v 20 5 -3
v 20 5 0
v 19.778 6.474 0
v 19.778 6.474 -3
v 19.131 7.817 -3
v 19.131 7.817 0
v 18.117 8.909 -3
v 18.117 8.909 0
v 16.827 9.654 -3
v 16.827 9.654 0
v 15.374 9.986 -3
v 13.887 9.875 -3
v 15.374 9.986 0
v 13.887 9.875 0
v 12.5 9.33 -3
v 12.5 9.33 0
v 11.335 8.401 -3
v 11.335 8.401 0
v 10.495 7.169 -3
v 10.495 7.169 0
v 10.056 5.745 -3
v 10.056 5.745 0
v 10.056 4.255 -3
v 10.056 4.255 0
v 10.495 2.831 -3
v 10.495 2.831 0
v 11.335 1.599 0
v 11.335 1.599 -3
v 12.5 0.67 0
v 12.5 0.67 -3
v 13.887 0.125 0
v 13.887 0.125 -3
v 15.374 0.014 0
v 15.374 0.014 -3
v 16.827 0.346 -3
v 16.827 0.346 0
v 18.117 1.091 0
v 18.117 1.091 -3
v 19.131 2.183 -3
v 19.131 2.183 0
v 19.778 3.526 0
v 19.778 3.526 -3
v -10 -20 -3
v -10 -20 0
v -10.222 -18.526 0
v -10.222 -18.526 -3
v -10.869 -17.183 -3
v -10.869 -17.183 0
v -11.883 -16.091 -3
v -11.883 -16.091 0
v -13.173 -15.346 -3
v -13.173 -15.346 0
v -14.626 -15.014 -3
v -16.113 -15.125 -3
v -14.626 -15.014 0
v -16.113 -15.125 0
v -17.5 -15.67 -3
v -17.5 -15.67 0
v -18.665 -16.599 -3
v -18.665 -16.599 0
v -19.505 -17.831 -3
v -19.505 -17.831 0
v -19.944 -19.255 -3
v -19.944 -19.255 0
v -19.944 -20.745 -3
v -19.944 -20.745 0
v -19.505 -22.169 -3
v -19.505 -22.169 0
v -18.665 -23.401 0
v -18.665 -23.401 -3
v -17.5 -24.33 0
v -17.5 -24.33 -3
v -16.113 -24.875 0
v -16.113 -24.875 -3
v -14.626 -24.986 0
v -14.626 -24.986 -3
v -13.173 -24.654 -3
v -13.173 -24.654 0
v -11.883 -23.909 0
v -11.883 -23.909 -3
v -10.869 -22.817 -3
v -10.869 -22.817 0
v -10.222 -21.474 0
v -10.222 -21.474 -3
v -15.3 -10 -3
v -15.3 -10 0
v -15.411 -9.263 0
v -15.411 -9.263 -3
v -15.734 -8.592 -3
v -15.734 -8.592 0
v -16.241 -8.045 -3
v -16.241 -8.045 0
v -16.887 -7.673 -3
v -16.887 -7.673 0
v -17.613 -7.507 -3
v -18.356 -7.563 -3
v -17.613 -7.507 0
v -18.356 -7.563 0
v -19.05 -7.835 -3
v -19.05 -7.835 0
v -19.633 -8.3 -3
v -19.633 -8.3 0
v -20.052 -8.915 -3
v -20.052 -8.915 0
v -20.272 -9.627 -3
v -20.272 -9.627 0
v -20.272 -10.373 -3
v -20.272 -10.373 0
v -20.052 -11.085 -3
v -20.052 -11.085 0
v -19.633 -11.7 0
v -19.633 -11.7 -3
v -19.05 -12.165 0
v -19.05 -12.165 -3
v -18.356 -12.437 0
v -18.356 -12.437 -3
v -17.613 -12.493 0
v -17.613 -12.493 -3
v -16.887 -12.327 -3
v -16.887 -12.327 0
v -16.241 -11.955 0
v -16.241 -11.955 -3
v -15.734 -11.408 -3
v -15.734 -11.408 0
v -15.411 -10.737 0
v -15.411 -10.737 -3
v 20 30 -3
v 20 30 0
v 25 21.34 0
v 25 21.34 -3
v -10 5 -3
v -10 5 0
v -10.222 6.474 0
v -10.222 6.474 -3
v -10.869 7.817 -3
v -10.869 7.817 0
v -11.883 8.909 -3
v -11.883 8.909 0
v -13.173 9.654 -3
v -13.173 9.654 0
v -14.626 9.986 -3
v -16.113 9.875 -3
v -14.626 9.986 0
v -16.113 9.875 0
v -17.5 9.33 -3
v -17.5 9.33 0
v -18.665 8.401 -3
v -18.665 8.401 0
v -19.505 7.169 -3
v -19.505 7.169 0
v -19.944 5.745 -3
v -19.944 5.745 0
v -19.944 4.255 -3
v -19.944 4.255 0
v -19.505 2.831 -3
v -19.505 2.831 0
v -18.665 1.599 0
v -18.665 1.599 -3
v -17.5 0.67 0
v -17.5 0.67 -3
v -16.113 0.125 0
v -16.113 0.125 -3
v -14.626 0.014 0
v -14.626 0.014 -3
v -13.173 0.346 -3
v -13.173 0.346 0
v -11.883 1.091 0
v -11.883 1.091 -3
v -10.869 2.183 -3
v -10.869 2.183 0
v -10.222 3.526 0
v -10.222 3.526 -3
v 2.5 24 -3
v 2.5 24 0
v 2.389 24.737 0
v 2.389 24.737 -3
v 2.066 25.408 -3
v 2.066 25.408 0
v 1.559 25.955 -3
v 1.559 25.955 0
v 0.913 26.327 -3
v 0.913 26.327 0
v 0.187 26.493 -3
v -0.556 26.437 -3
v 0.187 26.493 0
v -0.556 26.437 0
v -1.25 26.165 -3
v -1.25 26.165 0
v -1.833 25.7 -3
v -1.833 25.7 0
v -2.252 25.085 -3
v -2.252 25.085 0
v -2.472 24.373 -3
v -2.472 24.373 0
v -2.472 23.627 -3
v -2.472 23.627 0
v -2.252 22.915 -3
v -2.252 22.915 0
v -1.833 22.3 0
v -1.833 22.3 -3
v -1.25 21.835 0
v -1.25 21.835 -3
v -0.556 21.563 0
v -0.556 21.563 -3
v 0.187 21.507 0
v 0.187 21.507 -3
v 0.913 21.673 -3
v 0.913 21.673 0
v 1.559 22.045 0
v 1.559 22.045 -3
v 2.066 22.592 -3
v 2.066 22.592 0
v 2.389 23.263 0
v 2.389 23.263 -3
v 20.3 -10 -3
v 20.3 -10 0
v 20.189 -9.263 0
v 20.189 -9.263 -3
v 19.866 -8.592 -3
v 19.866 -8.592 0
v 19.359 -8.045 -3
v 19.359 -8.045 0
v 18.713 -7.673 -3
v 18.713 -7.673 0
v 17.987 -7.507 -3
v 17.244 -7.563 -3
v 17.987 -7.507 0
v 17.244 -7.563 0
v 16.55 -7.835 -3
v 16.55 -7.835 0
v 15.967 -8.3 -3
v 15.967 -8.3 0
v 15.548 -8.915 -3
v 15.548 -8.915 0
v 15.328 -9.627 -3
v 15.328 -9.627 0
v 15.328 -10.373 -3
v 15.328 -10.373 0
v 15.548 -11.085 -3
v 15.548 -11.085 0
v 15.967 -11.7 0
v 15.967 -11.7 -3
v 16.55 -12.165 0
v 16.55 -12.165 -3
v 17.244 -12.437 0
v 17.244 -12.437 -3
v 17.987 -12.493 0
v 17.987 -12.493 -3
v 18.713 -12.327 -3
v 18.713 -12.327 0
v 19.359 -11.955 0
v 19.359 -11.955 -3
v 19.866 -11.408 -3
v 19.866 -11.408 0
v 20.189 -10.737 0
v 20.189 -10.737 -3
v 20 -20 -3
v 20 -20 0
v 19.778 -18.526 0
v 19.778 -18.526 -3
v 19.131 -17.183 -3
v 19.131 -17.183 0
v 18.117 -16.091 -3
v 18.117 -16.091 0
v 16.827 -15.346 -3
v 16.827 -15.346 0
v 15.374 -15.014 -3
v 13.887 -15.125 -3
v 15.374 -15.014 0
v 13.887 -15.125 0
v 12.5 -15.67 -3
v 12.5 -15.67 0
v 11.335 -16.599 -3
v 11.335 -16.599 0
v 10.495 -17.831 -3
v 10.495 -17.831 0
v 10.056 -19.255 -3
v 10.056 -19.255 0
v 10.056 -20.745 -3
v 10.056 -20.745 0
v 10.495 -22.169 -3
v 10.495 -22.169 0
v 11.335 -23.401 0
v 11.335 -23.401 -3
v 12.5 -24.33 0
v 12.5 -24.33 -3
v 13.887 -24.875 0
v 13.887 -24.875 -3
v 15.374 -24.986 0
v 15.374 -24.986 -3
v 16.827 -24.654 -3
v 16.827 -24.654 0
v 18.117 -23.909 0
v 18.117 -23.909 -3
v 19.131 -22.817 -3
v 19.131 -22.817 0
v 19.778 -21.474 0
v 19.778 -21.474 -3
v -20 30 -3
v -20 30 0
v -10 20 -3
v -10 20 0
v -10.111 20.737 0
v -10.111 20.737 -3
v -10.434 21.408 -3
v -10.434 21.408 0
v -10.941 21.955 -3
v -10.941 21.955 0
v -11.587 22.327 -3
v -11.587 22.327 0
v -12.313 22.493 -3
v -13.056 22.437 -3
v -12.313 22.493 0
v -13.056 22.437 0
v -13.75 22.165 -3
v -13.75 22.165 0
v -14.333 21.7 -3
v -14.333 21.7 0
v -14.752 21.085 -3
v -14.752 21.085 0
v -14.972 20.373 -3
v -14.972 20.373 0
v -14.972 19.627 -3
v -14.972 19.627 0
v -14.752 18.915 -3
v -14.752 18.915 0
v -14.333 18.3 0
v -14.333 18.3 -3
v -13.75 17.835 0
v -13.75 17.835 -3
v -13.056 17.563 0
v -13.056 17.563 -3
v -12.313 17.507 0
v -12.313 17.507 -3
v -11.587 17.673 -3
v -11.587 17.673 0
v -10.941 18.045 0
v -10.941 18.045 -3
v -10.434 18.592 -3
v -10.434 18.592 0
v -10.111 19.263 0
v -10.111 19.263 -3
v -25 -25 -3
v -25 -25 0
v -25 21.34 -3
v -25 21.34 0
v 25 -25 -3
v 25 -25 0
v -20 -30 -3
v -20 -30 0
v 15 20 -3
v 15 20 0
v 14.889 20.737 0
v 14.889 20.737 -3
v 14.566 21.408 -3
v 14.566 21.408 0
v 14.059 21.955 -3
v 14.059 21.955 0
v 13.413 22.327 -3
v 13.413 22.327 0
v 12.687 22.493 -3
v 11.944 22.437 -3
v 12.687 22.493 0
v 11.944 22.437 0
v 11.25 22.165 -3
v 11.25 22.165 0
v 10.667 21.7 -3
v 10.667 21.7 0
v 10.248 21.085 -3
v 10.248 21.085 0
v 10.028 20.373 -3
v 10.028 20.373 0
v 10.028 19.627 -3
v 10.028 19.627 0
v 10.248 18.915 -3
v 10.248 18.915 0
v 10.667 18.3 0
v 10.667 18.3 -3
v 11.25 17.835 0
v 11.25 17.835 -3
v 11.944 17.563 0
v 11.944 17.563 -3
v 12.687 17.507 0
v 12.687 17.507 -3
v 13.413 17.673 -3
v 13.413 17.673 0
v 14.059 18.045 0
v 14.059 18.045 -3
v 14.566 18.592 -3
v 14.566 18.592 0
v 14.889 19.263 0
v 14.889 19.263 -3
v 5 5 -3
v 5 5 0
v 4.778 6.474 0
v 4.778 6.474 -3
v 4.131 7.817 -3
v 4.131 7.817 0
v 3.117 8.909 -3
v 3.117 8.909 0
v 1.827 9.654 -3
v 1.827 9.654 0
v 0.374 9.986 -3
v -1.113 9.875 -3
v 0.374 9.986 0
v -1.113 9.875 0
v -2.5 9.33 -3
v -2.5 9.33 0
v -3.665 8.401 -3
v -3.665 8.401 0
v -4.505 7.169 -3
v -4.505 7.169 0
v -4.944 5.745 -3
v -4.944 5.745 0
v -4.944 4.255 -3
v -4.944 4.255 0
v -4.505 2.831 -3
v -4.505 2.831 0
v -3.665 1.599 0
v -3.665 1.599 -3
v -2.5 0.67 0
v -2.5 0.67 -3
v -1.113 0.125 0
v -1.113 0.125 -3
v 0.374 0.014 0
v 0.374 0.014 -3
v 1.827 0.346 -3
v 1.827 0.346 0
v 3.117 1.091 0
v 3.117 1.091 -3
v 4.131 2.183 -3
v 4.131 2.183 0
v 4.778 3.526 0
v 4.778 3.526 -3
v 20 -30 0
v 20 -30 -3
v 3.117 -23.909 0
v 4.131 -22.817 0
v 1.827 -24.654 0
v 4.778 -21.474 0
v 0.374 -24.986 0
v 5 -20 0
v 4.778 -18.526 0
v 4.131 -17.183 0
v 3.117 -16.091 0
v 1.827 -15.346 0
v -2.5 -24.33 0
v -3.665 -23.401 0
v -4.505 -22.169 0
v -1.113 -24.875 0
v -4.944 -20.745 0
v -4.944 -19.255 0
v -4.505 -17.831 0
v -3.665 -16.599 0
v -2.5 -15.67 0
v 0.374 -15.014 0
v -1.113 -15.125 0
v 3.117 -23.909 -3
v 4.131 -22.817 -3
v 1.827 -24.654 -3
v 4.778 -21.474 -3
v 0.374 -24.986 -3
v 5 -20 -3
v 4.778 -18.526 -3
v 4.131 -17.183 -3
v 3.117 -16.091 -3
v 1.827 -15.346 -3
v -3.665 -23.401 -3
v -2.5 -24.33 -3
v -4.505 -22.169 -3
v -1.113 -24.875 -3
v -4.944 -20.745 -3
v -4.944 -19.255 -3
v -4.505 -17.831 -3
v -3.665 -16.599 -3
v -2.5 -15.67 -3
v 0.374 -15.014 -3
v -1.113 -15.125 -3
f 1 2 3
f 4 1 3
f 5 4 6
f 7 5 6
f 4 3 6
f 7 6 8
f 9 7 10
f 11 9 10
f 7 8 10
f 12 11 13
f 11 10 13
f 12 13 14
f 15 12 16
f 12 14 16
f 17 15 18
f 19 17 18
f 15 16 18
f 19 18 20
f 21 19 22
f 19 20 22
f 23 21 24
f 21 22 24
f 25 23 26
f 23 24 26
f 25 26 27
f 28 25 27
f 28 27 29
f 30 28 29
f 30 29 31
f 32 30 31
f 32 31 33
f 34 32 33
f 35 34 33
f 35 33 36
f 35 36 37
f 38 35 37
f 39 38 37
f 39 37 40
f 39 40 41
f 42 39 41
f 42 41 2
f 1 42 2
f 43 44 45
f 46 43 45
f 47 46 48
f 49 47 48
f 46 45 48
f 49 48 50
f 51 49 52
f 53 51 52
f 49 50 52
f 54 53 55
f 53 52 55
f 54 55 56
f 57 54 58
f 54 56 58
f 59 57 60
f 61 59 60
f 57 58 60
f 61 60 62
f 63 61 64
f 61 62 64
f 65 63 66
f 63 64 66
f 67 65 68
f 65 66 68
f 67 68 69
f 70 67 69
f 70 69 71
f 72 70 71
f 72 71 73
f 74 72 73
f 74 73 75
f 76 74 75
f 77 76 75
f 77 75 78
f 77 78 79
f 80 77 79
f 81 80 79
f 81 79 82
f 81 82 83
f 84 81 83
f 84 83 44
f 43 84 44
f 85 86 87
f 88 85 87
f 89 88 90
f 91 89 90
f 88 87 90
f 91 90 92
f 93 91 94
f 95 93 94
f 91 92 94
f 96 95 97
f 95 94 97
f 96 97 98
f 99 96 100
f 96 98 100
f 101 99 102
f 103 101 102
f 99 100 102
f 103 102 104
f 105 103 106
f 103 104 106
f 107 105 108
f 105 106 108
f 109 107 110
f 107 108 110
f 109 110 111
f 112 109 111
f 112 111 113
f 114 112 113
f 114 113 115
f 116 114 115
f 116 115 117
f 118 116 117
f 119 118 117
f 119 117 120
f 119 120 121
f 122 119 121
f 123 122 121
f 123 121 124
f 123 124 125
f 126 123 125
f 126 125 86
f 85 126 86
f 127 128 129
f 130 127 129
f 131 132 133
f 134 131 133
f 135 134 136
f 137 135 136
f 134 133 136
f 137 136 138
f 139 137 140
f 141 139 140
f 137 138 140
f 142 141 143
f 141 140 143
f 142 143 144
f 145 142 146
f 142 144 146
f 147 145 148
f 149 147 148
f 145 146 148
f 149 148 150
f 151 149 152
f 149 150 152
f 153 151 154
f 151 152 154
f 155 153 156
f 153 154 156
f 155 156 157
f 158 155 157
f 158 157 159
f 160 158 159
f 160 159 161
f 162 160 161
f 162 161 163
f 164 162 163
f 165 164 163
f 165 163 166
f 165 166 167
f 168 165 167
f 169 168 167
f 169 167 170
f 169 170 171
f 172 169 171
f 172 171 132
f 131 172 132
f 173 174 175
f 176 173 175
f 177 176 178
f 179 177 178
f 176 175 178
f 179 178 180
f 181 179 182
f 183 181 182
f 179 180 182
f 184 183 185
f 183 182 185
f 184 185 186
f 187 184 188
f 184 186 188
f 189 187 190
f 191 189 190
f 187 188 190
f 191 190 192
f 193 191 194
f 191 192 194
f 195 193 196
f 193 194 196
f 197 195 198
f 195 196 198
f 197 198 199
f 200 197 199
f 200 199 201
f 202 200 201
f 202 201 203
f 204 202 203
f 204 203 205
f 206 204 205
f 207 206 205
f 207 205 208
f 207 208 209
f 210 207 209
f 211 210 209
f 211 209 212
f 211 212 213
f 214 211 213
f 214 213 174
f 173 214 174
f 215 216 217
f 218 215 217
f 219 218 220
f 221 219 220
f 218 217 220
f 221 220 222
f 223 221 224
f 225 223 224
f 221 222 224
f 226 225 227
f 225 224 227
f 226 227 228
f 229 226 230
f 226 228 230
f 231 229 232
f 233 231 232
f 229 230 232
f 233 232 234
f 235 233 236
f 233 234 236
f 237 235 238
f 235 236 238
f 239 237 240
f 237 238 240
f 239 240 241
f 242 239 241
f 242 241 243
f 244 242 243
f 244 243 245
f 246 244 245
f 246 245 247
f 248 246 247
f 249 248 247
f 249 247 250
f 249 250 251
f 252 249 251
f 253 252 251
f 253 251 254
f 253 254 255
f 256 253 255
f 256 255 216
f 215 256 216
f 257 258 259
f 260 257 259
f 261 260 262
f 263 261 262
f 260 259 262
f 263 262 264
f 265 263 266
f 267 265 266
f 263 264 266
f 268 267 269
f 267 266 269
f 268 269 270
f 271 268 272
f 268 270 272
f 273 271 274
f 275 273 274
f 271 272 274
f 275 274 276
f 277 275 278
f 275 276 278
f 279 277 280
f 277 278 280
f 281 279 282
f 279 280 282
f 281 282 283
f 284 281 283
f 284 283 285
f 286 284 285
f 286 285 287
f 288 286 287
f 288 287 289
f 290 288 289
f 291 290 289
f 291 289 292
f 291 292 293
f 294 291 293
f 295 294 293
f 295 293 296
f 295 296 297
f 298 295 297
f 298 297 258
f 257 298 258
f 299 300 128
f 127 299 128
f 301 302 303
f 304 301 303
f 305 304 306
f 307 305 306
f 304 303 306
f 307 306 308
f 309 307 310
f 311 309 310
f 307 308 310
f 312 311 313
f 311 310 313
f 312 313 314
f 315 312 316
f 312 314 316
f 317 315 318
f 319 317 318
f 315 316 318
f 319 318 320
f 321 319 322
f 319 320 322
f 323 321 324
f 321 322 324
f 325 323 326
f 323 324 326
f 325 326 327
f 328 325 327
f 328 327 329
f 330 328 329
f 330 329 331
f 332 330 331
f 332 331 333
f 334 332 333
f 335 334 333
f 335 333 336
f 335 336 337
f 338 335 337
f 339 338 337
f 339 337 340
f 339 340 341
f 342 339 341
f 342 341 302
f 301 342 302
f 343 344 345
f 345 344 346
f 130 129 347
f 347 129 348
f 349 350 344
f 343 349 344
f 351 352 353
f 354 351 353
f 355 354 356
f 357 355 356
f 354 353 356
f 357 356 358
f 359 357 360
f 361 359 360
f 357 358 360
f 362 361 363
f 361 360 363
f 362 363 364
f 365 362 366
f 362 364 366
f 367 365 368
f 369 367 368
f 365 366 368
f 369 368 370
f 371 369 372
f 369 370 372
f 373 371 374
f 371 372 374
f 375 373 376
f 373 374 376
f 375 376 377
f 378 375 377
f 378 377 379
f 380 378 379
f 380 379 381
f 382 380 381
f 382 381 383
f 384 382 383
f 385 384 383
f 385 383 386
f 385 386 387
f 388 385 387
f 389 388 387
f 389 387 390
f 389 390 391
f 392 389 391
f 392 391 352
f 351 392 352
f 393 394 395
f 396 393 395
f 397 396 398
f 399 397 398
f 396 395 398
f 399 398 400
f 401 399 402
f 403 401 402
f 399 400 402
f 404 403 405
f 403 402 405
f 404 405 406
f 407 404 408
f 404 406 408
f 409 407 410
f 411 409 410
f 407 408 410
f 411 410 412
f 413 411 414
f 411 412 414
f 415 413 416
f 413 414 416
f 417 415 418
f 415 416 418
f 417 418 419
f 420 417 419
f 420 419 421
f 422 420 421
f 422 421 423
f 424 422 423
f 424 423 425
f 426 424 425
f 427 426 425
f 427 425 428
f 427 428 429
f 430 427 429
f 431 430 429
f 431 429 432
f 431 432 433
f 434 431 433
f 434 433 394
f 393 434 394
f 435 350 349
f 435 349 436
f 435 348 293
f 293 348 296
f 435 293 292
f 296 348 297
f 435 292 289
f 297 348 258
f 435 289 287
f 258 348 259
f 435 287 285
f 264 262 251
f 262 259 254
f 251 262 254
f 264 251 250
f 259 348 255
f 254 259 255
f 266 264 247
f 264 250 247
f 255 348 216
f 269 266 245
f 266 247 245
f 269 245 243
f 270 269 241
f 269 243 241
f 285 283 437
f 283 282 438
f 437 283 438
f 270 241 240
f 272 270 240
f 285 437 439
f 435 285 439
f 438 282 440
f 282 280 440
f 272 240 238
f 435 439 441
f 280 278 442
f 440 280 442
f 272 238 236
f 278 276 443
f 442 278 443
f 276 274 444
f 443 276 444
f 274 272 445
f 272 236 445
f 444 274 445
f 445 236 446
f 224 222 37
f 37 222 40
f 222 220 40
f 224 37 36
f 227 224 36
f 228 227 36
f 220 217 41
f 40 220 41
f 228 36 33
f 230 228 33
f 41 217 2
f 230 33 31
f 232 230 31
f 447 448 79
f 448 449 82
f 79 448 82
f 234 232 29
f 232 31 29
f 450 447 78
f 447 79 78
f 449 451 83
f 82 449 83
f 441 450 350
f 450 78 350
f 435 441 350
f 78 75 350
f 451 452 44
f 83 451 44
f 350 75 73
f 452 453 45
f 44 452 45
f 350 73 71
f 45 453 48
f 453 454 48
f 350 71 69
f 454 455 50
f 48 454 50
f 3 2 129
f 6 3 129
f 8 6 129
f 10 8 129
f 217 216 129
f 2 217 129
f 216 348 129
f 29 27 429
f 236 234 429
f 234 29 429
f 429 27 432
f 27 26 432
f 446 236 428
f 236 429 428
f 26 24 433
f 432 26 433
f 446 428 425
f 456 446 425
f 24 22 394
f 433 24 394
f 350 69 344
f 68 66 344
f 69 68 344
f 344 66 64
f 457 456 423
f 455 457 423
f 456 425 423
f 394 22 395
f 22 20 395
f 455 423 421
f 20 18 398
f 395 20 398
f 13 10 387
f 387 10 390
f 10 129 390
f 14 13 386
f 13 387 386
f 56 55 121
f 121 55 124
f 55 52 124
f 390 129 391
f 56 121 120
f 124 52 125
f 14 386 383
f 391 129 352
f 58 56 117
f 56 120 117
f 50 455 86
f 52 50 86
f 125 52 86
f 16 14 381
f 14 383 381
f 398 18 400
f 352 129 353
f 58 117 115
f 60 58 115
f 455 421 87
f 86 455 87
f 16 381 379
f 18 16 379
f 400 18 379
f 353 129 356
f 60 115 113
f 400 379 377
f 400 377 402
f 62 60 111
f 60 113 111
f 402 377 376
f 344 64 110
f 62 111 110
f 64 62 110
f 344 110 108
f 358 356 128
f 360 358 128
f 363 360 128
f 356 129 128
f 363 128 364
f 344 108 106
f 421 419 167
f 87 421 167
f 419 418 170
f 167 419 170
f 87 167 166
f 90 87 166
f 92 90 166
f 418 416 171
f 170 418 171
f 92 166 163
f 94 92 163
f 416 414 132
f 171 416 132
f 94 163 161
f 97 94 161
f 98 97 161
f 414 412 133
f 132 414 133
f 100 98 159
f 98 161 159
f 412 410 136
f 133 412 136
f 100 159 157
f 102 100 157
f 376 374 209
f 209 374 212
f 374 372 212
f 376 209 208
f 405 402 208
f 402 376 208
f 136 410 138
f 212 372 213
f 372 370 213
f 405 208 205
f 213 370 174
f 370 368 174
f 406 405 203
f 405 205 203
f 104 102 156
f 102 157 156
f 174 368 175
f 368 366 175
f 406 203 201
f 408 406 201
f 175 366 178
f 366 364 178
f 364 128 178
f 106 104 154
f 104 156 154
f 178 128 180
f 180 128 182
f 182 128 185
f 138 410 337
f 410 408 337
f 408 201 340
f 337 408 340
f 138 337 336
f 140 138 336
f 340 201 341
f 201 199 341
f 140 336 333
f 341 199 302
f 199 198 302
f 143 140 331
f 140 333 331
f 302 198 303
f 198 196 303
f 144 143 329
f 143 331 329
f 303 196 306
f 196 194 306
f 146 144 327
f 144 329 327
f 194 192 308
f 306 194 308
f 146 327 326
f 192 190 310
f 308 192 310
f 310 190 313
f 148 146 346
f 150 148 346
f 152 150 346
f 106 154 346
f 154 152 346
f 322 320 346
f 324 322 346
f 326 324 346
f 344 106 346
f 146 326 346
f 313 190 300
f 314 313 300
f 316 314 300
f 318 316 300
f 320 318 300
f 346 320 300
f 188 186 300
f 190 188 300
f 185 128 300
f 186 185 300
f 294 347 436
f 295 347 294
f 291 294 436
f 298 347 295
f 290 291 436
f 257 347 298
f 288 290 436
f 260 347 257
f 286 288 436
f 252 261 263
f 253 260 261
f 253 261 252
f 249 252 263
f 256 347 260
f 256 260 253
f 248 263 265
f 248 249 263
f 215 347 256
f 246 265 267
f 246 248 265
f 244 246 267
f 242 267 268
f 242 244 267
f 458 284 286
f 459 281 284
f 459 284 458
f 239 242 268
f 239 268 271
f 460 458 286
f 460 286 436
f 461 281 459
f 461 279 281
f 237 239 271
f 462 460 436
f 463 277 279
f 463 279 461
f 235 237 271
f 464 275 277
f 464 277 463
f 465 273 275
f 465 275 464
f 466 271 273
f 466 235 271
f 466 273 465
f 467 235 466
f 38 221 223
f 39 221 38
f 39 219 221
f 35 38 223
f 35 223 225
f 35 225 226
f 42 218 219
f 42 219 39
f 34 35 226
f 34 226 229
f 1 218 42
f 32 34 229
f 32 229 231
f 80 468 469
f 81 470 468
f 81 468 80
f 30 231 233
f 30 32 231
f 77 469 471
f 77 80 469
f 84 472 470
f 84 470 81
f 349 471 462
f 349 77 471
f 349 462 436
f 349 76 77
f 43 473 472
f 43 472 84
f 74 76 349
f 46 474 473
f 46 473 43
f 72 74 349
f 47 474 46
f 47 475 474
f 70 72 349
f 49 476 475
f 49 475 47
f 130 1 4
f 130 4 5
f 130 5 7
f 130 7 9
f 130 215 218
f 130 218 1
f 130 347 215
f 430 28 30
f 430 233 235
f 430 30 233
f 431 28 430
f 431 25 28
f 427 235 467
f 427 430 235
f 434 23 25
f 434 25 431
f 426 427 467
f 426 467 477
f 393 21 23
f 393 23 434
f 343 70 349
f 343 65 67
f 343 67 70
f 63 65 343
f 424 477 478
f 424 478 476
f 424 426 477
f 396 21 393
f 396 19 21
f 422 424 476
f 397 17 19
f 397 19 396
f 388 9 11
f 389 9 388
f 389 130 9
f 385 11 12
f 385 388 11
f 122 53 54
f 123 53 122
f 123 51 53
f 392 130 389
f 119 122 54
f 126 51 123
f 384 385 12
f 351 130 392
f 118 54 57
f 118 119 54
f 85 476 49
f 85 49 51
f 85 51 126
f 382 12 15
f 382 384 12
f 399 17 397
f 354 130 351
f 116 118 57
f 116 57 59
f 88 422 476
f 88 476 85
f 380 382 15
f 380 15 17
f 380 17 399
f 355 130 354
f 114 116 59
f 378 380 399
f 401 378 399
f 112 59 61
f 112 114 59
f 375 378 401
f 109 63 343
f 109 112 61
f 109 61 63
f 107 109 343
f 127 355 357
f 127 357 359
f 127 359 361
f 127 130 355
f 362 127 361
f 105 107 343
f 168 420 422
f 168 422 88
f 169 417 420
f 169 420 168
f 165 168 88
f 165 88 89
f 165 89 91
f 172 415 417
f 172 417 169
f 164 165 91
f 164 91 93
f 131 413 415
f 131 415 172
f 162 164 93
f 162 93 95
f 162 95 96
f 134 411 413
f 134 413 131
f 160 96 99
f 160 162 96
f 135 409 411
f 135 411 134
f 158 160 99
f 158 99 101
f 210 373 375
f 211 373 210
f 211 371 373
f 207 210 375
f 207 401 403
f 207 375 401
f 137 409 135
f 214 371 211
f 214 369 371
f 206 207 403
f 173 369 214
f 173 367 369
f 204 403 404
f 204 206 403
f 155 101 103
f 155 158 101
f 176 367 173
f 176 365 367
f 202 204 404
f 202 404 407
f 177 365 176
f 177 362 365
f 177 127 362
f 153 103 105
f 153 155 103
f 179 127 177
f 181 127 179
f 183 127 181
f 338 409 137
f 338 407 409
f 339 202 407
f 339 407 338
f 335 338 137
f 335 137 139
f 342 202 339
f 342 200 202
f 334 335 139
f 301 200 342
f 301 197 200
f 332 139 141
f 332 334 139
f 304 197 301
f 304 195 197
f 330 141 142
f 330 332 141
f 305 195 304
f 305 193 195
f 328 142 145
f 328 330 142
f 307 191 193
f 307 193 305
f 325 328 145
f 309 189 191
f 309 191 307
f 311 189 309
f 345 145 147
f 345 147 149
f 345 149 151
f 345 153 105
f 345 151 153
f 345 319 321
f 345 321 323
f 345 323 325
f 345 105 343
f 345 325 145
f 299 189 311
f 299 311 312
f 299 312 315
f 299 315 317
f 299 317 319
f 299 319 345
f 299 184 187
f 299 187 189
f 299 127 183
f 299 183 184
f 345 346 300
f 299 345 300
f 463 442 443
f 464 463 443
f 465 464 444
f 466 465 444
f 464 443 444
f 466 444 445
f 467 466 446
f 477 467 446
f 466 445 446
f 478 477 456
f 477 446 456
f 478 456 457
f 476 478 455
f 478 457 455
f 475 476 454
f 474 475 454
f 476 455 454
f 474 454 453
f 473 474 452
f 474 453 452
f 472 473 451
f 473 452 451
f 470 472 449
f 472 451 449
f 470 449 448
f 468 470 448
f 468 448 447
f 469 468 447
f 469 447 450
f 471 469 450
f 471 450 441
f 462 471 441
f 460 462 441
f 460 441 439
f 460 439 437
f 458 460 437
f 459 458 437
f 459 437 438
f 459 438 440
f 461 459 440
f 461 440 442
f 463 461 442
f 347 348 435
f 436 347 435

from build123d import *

# Parameters (mm, degrees)
SM_BASE_FLANGE_1_DEPTH = 3
CUT_EXTRUDE_1_REACH    = 41.166
SKETCH_6_R             = 2.5
CUT_EXTRUDE_2_REACH    = 41.166
SKETCH_7_R             = 5


# Sheet-metal steps are written as plain solids
with BuildPart() as part:
    # Sketch 1 → 基体-法兰1 (new body)
    with BuildSketch(Plane.XY):
        Polygon((20, -30), (14.284239003, -30), (-14.284239003, -30), (-20, -30), (-25, -25), (-25, 21.339745962), (-20, 30), (20, 30), (25, 21.339745962), (25, -25), align=None)
    extrude(amount=-SM_BASE_FLANGE_1_DEPTH)

    # 草图6 → 切除-拉伸1 (cut, up to next)
    with BuildSketch(Plane.XY, mode=Mode.PRIVATE) as cut_extrude_1_sk1:
        with Locations((0, 24)):
            Circle(SKETCH_6_R)
    cut_extrude_1_tool1 = extrude(cut_extrude_1_sk1.sketch, amount=-CUT_EXTRUDE_1_REACH, mode=Mode.PRIVATE) & part.part
    # 草图6 → 切除-拉伸1 (cut, up to next)
    with BuildSketch(Plane.XY, mode=Mode.PRIVATE) as cut_extrude_1_sk2:
        with Locations((-17.8, -10)):
            Circle(SKETCH_6_R)
    cut_extrude_1_tool2 = extrude(cut_extrude_1_sk2.sketch, amount=-CUT_EXTRUDE_1_REACH, mode=Mode.PRIVATE) & part.part
    # 草图6 → 切除-拉伸1 (cut, up to next)
    with BuildSketch(Plane.XY, mode=Mode.PRIVATE) as cut_extrude_1_sk3:
        with Locations((17.8, -10)):
            Circle(SKETCH_6_R)
    cut_extrude_1_tool3 = extrude(cut_extrude_1_sk3.sketch, amount=-CUT_EXTRUDE_1_REACH, mode=Mode.PRIVATE) & part.part
    # 草图6 → 切除-拉伸1 (cut, up to next)
    with BuildSketch(Plane.XY, mode=Mode.PRIVATE) as cut_extrude_1_sk4:
        with Locations((-12.5, 20)):
            Circle(SKETCH_6_R)
    cut_extrude_1_tool4 = extrude(cut_extrude_1_sk4.sketch, amount=-CUT_EXTRUDE_1_REACH, mode=Mode.PRIVATE) & part.part
    # 草图6 → 切除-拉伸1 (cut, up to next)
    with BuildSketch(Plane.XY, mode=Mode.PRIVATE) as cut_extrude_1_sk5:
        with Locations((12.5, 20)):
            Circle(SKETCH_6_R)
    cut_extrude_1_tool5 = extrude(cut_extrude_1_sk5.sketch, amount=-CUT_EXTRUDE_1_REACH, mode=Mode.PRIVATE) & part.part
    add(cut_extrude_1_tool1.solids().sort_by_distance((0, 24, 0))[0], mode=Mode.SUBTRACT)
    add(cut_extrude_1_tool2.solids().sort_by_distance((-17.8, -10, 0))[0], mode=Mode.SUBTRACT)
    add(cut_extrude_1_tool3.solids().sort_by_distance((17.8, -10, 0))[0], mode=Mode.SUBTRACT)
    add(cut_extrude_1_tool4.solids().sort_by_distance((-12.5, 20, 0))[0], mode=Mode.SUBTRACT)
    add(cut_extrude_1_tool5.solids().sort_by_distance((12.5, 20, 0))[0], mode=Mode.SUBTRACT)

    # 草图7 → 切除-拉伸2 (cut, up to next)
    with BuildSketch(Plane.XY, mode=Mode.PRIVATE) as cut_extrude_2_sk1:
        with Locations((-15, 5)):
            Circle(SKETCH_7_R)
    cut_extrude_2_tool1 = extrude(cut_extrude_2_sk1.sketch, amount=-CUT_EXTRUDE_2_REACH, mode=Mode.PRIVATE) & part.part
    # 草图7 → 切除-拉伸2 (cut, up to next)
    with BuildSketch(Plane.XY, mode=Mode.PRIVATE) as cut_extrude_2_sk2:
        with Locations((15, 5)):
            Circle(SKETCH_7_R)
    cut_extrude_2_tool2 = extrude(cut_extrude_2_sk2.sketch, amount=-CUT_EXTRUDE_2_REACH, mode=Mode.PRIVATE) & part.part
    # 草图7 → 切除-拉伸2 (cut, up to next)
    with BuildSketch(Plane.XY, mode=Mode.PRIVATE) as cut_extrude_2_sk3:
        with Locations((0, -20)):
            Circle(SKETCH_7_R)
    cut_extrude_2_tool3 = extrude(cut_extrude_2_sk3.sketch, amount=-CUT_EXTRUDE_2_REACH, mode=Mode.PRIVATE) & part.part
    # 草图7 → 切除-拉伸2 (cut, up to next)
    with BuildSketch(Plane.XY, mode=Mode.PRIVATE) as cut_extrude_2_sk4:
        with Locations((-15, -20)):
            Circle(SKETCH_7_R)
    cut_extrude_2_tool4 = extrude(cut_extrude_2_sk4.sketch, amount=-CUT_EXTRUDE_2_REACH, mode=Mode.PRIVATE) & part.part
    # 草图7 → 切除-拉伸2 (cut, up to next)
    with BuildSketch(Plane.XY, mode=Mode.PRIVATE) as cut_extrude_2_sk5:
        with Locations((15, -20)):
            Circle(SKETCH_7_R)
    cut_extrude_2_tool5 = extrude(cut_extrude_2_sk5.sketch, amount=-CUT_EXTRUDE_2_REACH, mode=Mode.PRIVATE) & part.part
    # 草图7 → 切除-拉伸2 (cut, up to next)
    with BuildSketch(Plane.XY, mode=Mode.PRIVATE) as cut_extrude_2_sk6:
        with Locations((0, 5)):
            Circle(SKETCH_7_R)
    cut_extrude_2_tool6 = extrude(cut_extrude_2_sk6.sketch, amount=-CUT_EXTRUDE_2_REACH, mode=Mode.PRIVATE) & part.part
    add(cut_extrude_2_tool1.solids().sort_by_distance((-15, 5, 0))[0], mode=Mode.SUBTRACT)
    add(cut_extrude_2_tool2.solids().sort_by_distance((15, 5, 0))[0], mode=Mode.SUBTRACT)
    add(cut_extrude_2_tool3.solids().sort_by_distance((0, -20, 0))[0], mode=Mode.SUBTRACT)
    add(cut_extrude_2_tool4.solids().sort_by_distance((-15, -20, 0))[0], mode=Mode.SUBTRACT)
    add(cut_extrude_2_tool5.solids().sort_by_distance((15, -20, 0))[0], mode=Mode.SUBTRACT)
    add(cut_extrude_2_tool6.solids().sort_by_distance((0, 5, 0))[0], mode=Mode.SUBTRACT)


solid = part.part
